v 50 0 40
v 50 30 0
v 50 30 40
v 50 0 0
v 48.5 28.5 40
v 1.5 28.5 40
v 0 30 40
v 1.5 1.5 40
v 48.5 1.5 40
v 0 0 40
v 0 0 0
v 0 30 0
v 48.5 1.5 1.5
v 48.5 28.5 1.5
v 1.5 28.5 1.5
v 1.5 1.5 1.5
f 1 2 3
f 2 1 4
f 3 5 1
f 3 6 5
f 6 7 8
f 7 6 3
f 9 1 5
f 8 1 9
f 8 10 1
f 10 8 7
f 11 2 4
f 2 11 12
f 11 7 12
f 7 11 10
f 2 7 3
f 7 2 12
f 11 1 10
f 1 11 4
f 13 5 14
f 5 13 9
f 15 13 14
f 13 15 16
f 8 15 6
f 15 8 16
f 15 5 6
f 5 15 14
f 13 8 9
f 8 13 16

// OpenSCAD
$fn = 32;

// ----------------------------------------------------------------------
// Open box: 1.5 mm walls
// ----------------------------------------------------------------------

// --- parameters (mm) ---
box_l = 50;               // outer length, X
box_w = 30;               // outer width, Y
box_h = 40;               // outer height, Z
wall = 1.5;               // wall thickness
floor = 1.5;              // floor thickness

difference() {
  cube([box_l, box_w, box_h]);
  translate([wall, wall, floor])
    cube([box_l - 2 * wall, box_w - 2 * wall, box_h]);
}
